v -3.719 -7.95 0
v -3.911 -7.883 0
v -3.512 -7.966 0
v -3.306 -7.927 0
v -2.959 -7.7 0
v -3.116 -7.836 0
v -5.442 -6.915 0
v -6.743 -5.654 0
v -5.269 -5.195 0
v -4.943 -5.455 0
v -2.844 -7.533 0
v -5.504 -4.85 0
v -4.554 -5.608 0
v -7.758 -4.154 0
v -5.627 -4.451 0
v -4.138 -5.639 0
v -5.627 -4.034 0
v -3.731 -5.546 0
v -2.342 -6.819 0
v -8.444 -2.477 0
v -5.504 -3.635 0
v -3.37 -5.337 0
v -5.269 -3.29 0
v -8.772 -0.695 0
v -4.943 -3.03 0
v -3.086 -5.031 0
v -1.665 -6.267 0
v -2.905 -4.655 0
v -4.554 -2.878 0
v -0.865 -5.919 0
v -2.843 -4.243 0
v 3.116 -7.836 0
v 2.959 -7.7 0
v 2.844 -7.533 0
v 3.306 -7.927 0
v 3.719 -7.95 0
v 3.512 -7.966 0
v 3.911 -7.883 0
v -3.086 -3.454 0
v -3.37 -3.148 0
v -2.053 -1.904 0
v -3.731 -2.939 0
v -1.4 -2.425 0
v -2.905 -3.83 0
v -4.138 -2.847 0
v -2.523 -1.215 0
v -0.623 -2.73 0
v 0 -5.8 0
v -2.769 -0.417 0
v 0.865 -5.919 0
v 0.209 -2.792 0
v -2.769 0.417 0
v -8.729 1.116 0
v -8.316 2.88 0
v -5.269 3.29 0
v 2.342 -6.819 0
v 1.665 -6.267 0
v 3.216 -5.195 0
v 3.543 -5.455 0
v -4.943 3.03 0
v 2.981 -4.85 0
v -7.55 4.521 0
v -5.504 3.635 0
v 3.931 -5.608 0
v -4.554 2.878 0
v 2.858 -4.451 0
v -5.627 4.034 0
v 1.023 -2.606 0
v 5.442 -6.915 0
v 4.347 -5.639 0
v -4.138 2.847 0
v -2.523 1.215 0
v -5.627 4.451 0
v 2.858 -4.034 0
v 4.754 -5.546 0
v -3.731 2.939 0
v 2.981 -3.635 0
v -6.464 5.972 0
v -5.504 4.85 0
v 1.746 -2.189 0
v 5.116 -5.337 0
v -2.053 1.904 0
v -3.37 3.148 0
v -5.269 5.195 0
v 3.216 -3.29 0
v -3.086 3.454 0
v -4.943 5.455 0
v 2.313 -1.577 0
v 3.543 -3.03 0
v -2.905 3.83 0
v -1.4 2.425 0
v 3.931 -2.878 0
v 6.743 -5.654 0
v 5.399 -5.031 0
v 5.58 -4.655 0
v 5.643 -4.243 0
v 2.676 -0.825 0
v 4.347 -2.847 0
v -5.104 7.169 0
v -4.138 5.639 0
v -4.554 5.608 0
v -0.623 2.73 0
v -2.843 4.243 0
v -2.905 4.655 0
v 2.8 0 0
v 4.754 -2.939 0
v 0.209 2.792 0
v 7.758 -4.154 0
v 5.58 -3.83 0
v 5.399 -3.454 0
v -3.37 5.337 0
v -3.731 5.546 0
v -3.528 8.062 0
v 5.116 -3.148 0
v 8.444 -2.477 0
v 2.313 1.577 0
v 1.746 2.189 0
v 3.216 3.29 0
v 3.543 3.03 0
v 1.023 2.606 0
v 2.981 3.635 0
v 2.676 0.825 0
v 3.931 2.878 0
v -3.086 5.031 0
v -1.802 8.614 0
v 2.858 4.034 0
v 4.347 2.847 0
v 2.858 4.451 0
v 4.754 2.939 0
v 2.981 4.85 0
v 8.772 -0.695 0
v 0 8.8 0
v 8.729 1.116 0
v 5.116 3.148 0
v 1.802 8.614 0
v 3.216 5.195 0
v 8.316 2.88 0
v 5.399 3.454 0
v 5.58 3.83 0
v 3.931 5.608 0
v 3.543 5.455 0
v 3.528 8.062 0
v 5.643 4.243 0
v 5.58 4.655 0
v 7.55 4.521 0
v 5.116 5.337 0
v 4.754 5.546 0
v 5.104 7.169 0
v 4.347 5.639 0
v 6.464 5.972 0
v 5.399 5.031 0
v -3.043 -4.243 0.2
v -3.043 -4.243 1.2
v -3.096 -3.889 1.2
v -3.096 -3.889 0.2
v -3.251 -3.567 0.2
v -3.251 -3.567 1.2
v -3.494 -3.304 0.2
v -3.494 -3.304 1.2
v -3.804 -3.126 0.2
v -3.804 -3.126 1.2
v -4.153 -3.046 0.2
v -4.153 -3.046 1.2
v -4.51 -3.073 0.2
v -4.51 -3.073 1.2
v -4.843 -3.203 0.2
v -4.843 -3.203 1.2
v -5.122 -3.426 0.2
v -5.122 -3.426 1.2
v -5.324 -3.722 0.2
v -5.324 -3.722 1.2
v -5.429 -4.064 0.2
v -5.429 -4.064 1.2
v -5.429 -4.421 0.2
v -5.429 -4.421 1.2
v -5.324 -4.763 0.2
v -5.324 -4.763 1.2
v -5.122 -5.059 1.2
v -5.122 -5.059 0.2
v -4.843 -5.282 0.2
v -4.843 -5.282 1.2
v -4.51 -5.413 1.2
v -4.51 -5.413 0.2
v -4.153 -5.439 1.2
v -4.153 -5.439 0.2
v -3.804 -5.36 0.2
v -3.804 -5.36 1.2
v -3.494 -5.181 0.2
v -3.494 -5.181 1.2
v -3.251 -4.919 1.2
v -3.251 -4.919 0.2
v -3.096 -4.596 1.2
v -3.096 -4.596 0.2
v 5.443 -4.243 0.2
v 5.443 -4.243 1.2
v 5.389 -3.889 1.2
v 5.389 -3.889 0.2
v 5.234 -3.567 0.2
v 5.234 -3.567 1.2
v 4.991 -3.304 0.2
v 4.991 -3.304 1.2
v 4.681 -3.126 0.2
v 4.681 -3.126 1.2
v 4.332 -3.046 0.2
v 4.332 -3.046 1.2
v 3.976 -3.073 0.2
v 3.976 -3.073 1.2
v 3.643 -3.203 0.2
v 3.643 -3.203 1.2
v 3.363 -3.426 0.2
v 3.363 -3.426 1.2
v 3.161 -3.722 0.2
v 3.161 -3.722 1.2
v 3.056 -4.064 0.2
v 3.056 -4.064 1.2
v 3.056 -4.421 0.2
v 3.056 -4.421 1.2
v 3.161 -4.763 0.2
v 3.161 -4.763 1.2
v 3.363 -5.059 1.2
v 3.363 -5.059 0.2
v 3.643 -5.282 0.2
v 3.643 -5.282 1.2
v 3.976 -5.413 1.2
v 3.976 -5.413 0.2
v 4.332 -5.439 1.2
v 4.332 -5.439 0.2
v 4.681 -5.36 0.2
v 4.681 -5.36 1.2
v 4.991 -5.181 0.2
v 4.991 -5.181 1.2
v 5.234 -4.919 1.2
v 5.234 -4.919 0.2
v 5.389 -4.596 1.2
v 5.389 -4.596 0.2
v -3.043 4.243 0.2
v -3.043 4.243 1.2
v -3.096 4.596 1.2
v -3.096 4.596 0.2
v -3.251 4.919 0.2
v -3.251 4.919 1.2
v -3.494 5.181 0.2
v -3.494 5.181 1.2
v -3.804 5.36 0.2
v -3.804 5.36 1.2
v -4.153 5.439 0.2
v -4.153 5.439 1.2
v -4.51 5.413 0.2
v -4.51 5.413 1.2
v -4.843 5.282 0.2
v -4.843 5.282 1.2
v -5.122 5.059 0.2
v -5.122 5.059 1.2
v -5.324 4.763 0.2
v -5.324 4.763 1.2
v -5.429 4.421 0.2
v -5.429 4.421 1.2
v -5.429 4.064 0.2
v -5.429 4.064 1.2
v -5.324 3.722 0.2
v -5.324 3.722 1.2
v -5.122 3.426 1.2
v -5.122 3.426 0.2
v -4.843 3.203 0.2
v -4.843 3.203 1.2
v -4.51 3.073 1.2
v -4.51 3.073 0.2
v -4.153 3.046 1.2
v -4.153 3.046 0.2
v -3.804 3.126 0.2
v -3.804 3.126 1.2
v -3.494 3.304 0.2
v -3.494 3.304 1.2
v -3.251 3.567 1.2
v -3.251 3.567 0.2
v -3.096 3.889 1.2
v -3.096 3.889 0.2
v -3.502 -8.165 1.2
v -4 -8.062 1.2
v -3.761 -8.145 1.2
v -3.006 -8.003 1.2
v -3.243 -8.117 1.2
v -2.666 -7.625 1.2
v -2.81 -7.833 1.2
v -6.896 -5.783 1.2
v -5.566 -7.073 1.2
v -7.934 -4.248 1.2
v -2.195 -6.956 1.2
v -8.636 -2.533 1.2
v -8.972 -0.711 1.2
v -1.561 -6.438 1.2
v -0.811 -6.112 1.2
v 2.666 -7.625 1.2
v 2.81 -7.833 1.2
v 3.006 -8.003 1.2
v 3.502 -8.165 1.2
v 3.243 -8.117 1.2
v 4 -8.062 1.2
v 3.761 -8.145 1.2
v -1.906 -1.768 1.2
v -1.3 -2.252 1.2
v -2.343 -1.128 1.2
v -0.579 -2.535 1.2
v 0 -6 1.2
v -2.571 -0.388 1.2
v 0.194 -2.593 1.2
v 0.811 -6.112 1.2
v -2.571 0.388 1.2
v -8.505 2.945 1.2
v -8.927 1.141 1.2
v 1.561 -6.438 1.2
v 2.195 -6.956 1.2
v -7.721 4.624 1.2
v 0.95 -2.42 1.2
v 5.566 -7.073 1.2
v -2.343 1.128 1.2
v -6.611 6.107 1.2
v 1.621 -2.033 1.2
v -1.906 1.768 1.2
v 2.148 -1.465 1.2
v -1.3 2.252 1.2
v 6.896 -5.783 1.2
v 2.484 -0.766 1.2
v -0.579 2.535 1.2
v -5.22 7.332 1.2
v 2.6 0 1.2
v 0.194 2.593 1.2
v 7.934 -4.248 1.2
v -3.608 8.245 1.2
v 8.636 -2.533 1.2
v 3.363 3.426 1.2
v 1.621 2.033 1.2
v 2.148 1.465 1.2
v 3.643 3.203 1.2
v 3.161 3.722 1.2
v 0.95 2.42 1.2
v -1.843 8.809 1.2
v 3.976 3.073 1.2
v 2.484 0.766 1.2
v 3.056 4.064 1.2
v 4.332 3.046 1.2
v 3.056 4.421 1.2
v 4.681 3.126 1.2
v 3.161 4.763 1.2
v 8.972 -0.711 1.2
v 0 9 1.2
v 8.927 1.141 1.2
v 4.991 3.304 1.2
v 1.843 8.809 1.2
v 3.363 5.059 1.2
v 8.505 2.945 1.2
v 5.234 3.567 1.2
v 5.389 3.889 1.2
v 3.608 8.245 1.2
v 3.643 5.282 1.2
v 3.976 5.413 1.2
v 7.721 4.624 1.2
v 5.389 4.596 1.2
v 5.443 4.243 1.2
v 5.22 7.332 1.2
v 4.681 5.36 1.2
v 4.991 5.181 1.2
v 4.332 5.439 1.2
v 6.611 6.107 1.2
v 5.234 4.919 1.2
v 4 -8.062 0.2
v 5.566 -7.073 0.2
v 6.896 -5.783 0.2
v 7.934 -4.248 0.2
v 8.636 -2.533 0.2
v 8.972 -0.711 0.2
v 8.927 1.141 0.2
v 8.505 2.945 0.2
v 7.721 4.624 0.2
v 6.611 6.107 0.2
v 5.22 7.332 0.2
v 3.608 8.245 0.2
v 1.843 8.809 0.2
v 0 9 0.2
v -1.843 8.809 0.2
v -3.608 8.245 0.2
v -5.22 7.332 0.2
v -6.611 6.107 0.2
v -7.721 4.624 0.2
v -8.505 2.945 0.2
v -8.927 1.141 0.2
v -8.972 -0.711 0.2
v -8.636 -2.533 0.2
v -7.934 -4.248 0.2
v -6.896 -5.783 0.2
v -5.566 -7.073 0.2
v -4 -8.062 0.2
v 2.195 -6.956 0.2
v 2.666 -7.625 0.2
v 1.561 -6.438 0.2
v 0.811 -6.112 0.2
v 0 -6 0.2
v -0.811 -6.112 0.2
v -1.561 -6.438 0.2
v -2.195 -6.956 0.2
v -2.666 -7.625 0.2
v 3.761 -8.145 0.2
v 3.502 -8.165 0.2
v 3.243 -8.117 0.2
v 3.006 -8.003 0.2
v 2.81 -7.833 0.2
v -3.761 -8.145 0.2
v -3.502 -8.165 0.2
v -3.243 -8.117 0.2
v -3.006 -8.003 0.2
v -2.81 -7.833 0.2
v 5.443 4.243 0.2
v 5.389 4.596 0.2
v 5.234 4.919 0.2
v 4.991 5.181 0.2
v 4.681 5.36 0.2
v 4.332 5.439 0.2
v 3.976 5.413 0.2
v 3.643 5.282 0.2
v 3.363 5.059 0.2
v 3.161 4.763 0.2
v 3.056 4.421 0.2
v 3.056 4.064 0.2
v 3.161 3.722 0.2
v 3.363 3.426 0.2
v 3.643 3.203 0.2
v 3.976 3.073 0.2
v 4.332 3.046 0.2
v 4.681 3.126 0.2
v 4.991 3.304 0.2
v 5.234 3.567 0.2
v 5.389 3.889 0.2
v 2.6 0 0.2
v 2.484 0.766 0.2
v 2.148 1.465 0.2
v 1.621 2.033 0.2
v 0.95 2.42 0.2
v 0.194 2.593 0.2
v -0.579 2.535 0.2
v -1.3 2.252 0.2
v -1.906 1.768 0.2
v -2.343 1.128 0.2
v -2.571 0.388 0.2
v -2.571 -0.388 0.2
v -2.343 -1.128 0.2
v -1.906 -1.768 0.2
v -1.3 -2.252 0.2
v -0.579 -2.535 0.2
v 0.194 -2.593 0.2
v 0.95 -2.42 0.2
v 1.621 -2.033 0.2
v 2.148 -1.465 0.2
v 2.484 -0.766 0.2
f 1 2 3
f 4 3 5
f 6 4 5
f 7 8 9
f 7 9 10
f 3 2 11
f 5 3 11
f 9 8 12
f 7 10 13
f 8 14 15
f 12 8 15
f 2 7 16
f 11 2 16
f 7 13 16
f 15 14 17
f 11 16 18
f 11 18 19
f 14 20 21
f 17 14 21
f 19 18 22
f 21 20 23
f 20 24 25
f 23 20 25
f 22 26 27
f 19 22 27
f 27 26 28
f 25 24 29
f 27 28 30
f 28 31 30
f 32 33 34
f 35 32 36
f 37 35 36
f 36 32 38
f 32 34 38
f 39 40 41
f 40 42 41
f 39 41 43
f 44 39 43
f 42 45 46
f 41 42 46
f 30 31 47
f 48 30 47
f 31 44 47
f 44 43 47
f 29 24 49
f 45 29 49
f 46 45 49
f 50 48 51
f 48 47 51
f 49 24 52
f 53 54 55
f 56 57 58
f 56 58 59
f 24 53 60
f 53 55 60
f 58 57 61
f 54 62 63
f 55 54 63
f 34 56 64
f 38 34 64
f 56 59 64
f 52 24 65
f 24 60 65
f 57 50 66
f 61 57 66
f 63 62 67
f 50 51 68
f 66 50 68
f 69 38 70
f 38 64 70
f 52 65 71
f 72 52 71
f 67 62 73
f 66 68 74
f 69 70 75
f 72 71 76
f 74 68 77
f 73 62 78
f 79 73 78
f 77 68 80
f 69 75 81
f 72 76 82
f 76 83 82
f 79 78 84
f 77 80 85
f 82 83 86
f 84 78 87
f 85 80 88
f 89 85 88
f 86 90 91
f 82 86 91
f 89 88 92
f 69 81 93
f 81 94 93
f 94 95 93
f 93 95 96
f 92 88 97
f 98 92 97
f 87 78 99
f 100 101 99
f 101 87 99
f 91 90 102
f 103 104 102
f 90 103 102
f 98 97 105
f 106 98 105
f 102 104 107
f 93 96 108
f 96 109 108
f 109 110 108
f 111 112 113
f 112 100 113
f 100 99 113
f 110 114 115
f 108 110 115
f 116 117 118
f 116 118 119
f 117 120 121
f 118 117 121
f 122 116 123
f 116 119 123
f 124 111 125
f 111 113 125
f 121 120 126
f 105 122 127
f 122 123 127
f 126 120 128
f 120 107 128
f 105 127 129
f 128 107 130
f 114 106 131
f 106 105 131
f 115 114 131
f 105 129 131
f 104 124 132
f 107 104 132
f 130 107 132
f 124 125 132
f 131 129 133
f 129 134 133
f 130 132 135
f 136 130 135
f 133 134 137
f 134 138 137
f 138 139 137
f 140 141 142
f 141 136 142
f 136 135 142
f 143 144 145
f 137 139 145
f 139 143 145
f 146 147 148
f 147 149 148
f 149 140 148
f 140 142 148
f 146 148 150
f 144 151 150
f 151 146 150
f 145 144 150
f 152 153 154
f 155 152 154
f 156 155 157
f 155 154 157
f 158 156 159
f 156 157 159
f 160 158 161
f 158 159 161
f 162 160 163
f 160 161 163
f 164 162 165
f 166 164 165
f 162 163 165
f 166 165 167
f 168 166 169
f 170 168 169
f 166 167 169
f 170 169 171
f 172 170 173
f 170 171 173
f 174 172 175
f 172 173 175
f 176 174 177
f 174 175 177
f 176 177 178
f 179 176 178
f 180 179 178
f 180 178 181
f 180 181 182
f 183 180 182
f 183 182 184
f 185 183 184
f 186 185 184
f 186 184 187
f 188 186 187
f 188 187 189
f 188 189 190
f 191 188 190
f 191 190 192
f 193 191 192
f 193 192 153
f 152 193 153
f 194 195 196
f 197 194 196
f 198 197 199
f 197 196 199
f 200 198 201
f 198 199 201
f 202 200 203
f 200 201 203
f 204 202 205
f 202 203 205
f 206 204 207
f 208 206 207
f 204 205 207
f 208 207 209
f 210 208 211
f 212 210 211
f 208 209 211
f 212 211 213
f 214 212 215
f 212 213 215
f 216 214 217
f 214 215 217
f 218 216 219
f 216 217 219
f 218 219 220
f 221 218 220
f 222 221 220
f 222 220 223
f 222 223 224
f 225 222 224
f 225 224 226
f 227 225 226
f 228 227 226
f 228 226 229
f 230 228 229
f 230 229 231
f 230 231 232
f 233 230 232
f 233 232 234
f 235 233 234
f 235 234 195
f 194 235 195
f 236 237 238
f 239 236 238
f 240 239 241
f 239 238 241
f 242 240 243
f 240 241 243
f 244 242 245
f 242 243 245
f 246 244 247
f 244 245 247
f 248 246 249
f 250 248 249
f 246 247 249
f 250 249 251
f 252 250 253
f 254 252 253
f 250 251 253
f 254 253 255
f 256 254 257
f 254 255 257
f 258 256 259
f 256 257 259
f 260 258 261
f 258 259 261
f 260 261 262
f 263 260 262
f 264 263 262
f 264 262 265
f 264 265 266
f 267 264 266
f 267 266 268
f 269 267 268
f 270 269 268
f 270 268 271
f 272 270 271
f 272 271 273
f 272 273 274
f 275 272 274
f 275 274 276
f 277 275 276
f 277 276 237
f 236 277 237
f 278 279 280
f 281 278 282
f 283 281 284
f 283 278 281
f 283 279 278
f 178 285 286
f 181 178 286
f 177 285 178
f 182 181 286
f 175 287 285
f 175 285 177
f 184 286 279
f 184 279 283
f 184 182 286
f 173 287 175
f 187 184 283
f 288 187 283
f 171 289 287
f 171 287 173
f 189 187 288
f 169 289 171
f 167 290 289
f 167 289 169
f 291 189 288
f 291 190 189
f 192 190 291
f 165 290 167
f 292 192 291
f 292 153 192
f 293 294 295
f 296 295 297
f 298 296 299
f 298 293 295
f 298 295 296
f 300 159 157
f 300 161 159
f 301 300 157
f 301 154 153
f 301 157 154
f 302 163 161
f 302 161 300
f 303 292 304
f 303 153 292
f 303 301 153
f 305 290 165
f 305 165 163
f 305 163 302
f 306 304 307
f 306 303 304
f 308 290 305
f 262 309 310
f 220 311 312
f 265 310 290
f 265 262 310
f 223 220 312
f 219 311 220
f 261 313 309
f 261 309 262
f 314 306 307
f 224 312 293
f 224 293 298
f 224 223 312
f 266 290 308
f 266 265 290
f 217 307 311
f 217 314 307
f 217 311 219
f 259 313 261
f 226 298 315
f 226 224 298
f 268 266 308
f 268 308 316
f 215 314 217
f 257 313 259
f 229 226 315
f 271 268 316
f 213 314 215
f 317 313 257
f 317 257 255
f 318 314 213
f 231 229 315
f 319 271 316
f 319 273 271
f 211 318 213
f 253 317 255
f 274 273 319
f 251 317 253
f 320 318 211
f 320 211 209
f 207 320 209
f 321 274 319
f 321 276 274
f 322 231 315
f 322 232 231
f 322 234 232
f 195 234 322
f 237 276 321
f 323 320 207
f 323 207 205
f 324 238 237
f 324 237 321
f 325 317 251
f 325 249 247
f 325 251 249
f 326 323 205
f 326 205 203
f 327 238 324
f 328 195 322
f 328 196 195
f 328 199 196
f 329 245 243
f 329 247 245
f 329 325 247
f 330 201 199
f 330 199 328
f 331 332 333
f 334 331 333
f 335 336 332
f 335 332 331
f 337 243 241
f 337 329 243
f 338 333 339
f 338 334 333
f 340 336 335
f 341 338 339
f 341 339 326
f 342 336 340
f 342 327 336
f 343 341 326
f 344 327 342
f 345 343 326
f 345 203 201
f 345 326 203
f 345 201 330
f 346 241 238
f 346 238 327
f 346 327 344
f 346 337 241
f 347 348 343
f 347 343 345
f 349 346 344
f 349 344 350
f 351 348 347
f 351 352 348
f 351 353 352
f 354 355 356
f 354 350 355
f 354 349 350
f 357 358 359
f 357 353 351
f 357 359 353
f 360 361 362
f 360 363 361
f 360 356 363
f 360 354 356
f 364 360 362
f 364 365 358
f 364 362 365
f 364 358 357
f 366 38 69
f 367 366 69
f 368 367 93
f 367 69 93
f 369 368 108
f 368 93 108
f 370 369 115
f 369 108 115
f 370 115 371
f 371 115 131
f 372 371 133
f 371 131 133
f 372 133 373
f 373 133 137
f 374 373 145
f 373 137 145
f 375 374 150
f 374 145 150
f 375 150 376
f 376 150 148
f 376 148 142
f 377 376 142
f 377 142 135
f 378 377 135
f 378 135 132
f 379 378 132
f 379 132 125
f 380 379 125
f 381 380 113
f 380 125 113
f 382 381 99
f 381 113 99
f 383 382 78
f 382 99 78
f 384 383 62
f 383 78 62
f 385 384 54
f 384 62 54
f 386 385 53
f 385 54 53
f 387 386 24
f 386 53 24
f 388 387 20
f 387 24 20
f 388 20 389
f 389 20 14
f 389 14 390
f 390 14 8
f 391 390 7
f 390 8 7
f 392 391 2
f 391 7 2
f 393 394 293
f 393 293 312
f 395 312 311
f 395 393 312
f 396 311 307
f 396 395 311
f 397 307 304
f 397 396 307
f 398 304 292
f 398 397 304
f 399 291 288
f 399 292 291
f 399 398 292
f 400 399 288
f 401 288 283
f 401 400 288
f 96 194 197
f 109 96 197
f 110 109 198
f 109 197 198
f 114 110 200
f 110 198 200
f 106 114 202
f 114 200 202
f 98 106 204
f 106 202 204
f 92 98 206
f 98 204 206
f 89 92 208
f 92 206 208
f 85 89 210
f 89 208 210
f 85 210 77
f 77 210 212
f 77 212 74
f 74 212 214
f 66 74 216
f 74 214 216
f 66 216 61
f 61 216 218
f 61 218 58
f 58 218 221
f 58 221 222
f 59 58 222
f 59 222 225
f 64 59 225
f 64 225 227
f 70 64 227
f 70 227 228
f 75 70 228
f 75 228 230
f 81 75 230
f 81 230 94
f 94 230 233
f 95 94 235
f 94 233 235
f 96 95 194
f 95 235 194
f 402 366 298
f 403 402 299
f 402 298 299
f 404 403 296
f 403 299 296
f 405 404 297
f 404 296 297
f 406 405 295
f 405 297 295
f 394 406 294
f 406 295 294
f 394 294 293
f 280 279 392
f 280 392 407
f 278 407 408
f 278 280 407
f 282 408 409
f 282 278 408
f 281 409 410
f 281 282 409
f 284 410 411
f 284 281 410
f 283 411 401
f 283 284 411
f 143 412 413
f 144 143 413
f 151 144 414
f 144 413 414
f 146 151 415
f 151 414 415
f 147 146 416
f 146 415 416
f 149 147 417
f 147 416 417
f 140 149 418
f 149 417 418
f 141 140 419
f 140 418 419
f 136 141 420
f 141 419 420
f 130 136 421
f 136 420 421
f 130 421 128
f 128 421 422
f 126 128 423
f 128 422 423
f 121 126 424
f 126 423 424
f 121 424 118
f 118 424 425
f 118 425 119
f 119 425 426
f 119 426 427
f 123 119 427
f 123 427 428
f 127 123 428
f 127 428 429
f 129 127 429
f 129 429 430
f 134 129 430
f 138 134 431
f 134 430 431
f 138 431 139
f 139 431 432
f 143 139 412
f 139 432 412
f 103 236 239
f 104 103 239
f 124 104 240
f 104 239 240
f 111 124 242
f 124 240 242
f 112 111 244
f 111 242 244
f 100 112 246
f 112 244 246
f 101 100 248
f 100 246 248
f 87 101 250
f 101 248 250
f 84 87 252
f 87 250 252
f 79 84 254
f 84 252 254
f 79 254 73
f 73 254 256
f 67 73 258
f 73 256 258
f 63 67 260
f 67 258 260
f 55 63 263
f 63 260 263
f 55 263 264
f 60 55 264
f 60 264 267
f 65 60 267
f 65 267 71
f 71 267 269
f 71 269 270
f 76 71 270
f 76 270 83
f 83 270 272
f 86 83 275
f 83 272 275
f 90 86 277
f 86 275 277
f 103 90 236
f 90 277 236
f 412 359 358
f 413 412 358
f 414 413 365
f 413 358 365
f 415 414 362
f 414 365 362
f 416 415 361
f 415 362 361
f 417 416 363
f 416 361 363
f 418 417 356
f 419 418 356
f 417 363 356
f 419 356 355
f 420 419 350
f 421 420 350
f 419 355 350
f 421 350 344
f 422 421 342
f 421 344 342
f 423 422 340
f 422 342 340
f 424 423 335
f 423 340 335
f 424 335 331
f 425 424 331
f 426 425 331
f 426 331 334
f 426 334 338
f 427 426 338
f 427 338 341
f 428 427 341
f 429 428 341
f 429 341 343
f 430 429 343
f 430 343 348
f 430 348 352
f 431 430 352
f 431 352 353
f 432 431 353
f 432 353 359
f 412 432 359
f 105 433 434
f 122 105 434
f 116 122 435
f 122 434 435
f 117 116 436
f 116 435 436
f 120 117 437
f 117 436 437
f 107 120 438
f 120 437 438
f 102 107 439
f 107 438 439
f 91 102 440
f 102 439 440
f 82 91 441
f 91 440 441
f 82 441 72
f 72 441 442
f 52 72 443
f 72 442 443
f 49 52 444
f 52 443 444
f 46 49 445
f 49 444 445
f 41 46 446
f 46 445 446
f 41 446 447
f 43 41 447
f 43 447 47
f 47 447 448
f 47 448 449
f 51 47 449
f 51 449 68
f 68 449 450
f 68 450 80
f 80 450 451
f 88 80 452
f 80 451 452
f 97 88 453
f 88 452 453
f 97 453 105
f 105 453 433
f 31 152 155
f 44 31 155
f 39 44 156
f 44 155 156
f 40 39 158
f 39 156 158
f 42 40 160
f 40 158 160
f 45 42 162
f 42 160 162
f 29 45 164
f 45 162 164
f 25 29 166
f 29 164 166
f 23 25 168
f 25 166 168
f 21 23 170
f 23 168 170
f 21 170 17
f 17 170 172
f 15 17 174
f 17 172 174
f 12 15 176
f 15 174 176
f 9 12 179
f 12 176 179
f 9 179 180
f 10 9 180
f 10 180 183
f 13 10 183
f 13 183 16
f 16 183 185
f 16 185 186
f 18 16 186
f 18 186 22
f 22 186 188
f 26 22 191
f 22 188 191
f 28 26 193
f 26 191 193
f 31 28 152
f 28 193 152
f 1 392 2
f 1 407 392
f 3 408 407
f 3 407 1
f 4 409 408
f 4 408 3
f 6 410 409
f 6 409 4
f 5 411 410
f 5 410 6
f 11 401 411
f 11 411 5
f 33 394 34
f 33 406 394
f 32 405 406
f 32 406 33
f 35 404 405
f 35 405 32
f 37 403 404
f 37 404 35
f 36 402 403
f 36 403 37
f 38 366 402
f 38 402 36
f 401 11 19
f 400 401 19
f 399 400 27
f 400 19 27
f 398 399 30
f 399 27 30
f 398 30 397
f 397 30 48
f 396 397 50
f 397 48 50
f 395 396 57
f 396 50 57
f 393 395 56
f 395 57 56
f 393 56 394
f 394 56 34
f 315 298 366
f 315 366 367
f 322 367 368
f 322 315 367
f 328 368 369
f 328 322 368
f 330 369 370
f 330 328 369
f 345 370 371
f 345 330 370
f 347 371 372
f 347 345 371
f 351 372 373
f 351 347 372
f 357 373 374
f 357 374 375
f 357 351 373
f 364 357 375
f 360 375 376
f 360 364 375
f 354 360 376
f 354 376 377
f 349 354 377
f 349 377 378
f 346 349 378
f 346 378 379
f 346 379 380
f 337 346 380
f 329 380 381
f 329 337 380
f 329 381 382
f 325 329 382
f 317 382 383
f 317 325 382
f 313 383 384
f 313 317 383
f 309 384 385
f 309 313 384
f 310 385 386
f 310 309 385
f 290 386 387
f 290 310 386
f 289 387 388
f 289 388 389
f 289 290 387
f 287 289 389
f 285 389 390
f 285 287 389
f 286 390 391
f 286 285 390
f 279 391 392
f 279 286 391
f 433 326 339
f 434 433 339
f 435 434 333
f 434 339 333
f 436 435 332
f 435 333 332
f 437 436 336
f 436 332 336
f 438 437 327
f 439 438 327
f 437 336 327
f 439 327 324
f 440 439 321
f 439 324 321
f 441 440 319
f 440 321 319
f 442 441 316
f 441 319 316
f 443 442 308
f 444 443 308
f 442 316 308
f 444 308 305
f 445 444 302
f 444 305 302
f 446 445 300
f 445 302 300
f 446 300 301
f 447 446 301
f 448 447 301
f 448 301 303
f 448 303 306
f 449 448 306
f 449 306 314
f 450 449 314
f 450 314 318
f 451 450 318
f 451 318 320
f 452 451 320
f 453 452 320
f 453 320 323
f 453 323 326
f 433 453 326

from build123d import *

# Parameters (mm, degrees)
F0_R     = 9
F0_R_2   = 1.2
F0_R_3   = 2.6
F2_R     = 3
F4_DEPTH = 1.201
F5_R     = 1
F6_SIZE  = 0.2


with BuildPart() as f3:
    # F3: sweep along a path in F1
    with BuildLine(Plane.XZ) as f3_path:
        Line((0, 0), (0, 1.2))
    # F0 (on Top) → F3 (sweep)
    with BuildSketch(Plane.XY):
        Circle(F0_R)
        with Locations((-4.2426406871, -4.2426406871)):
            Circle(F0_R_2, mode=Mode.SUBTRACT)
        with Locations((4.2426406871, -4.2426406871)):
            Circle(F0_R_2, mode=Mode.SUBTRACT)
        with Locations((-4.2426406871, 4.2426406871)):
            Circle(F0_R_2, mode=Mode.SUBTRACT)
        Circle(F0_R_3, mode=Mode.SUBTRACT)
        with Locations((4.2426406871, 4.2426406871)):
            Circle(F0_R_2, mode=Mode.SUBTRACT)
    sweep(path=f3_path.line)

    # F2 (on Top) → F4 (cut, through all)
    with BuildSketch(Plane.XY):
        with Locations((0, -9)):
            Circle(F2_R)
    extrude(amount=F4_DEPTH, mode=Mode.SUBTRACT)

    # F5
    f5_edges = [f3.edges().sort_by_distance(p)[0] for p in [
        (-2.95804, -8.5, 0.6),
        (2.95804, -8.5, 0.6),
    ]]
    fillet(f5_edges, radius=F5_R)

    # F6
    f6_edges = [f3.edges().sort_by_distance(p)[0] for p in [
        (0, 9, 0),
        (3.243317, -8.116813, 0),
        (-3.243317, -8.116813, 0),
        (0, -6, 0),
        (-5.442641, -4.242641, 0),
        (3.042641, -4.242641, 0),
        (-2.6, 0, 0),
        (-5.442641, 4.242641, 0),
        (3.042641, 4.242641, 0),
    ]]
    chamfer(f6_edges, length=F6_SIZE)


solid = f3.part
